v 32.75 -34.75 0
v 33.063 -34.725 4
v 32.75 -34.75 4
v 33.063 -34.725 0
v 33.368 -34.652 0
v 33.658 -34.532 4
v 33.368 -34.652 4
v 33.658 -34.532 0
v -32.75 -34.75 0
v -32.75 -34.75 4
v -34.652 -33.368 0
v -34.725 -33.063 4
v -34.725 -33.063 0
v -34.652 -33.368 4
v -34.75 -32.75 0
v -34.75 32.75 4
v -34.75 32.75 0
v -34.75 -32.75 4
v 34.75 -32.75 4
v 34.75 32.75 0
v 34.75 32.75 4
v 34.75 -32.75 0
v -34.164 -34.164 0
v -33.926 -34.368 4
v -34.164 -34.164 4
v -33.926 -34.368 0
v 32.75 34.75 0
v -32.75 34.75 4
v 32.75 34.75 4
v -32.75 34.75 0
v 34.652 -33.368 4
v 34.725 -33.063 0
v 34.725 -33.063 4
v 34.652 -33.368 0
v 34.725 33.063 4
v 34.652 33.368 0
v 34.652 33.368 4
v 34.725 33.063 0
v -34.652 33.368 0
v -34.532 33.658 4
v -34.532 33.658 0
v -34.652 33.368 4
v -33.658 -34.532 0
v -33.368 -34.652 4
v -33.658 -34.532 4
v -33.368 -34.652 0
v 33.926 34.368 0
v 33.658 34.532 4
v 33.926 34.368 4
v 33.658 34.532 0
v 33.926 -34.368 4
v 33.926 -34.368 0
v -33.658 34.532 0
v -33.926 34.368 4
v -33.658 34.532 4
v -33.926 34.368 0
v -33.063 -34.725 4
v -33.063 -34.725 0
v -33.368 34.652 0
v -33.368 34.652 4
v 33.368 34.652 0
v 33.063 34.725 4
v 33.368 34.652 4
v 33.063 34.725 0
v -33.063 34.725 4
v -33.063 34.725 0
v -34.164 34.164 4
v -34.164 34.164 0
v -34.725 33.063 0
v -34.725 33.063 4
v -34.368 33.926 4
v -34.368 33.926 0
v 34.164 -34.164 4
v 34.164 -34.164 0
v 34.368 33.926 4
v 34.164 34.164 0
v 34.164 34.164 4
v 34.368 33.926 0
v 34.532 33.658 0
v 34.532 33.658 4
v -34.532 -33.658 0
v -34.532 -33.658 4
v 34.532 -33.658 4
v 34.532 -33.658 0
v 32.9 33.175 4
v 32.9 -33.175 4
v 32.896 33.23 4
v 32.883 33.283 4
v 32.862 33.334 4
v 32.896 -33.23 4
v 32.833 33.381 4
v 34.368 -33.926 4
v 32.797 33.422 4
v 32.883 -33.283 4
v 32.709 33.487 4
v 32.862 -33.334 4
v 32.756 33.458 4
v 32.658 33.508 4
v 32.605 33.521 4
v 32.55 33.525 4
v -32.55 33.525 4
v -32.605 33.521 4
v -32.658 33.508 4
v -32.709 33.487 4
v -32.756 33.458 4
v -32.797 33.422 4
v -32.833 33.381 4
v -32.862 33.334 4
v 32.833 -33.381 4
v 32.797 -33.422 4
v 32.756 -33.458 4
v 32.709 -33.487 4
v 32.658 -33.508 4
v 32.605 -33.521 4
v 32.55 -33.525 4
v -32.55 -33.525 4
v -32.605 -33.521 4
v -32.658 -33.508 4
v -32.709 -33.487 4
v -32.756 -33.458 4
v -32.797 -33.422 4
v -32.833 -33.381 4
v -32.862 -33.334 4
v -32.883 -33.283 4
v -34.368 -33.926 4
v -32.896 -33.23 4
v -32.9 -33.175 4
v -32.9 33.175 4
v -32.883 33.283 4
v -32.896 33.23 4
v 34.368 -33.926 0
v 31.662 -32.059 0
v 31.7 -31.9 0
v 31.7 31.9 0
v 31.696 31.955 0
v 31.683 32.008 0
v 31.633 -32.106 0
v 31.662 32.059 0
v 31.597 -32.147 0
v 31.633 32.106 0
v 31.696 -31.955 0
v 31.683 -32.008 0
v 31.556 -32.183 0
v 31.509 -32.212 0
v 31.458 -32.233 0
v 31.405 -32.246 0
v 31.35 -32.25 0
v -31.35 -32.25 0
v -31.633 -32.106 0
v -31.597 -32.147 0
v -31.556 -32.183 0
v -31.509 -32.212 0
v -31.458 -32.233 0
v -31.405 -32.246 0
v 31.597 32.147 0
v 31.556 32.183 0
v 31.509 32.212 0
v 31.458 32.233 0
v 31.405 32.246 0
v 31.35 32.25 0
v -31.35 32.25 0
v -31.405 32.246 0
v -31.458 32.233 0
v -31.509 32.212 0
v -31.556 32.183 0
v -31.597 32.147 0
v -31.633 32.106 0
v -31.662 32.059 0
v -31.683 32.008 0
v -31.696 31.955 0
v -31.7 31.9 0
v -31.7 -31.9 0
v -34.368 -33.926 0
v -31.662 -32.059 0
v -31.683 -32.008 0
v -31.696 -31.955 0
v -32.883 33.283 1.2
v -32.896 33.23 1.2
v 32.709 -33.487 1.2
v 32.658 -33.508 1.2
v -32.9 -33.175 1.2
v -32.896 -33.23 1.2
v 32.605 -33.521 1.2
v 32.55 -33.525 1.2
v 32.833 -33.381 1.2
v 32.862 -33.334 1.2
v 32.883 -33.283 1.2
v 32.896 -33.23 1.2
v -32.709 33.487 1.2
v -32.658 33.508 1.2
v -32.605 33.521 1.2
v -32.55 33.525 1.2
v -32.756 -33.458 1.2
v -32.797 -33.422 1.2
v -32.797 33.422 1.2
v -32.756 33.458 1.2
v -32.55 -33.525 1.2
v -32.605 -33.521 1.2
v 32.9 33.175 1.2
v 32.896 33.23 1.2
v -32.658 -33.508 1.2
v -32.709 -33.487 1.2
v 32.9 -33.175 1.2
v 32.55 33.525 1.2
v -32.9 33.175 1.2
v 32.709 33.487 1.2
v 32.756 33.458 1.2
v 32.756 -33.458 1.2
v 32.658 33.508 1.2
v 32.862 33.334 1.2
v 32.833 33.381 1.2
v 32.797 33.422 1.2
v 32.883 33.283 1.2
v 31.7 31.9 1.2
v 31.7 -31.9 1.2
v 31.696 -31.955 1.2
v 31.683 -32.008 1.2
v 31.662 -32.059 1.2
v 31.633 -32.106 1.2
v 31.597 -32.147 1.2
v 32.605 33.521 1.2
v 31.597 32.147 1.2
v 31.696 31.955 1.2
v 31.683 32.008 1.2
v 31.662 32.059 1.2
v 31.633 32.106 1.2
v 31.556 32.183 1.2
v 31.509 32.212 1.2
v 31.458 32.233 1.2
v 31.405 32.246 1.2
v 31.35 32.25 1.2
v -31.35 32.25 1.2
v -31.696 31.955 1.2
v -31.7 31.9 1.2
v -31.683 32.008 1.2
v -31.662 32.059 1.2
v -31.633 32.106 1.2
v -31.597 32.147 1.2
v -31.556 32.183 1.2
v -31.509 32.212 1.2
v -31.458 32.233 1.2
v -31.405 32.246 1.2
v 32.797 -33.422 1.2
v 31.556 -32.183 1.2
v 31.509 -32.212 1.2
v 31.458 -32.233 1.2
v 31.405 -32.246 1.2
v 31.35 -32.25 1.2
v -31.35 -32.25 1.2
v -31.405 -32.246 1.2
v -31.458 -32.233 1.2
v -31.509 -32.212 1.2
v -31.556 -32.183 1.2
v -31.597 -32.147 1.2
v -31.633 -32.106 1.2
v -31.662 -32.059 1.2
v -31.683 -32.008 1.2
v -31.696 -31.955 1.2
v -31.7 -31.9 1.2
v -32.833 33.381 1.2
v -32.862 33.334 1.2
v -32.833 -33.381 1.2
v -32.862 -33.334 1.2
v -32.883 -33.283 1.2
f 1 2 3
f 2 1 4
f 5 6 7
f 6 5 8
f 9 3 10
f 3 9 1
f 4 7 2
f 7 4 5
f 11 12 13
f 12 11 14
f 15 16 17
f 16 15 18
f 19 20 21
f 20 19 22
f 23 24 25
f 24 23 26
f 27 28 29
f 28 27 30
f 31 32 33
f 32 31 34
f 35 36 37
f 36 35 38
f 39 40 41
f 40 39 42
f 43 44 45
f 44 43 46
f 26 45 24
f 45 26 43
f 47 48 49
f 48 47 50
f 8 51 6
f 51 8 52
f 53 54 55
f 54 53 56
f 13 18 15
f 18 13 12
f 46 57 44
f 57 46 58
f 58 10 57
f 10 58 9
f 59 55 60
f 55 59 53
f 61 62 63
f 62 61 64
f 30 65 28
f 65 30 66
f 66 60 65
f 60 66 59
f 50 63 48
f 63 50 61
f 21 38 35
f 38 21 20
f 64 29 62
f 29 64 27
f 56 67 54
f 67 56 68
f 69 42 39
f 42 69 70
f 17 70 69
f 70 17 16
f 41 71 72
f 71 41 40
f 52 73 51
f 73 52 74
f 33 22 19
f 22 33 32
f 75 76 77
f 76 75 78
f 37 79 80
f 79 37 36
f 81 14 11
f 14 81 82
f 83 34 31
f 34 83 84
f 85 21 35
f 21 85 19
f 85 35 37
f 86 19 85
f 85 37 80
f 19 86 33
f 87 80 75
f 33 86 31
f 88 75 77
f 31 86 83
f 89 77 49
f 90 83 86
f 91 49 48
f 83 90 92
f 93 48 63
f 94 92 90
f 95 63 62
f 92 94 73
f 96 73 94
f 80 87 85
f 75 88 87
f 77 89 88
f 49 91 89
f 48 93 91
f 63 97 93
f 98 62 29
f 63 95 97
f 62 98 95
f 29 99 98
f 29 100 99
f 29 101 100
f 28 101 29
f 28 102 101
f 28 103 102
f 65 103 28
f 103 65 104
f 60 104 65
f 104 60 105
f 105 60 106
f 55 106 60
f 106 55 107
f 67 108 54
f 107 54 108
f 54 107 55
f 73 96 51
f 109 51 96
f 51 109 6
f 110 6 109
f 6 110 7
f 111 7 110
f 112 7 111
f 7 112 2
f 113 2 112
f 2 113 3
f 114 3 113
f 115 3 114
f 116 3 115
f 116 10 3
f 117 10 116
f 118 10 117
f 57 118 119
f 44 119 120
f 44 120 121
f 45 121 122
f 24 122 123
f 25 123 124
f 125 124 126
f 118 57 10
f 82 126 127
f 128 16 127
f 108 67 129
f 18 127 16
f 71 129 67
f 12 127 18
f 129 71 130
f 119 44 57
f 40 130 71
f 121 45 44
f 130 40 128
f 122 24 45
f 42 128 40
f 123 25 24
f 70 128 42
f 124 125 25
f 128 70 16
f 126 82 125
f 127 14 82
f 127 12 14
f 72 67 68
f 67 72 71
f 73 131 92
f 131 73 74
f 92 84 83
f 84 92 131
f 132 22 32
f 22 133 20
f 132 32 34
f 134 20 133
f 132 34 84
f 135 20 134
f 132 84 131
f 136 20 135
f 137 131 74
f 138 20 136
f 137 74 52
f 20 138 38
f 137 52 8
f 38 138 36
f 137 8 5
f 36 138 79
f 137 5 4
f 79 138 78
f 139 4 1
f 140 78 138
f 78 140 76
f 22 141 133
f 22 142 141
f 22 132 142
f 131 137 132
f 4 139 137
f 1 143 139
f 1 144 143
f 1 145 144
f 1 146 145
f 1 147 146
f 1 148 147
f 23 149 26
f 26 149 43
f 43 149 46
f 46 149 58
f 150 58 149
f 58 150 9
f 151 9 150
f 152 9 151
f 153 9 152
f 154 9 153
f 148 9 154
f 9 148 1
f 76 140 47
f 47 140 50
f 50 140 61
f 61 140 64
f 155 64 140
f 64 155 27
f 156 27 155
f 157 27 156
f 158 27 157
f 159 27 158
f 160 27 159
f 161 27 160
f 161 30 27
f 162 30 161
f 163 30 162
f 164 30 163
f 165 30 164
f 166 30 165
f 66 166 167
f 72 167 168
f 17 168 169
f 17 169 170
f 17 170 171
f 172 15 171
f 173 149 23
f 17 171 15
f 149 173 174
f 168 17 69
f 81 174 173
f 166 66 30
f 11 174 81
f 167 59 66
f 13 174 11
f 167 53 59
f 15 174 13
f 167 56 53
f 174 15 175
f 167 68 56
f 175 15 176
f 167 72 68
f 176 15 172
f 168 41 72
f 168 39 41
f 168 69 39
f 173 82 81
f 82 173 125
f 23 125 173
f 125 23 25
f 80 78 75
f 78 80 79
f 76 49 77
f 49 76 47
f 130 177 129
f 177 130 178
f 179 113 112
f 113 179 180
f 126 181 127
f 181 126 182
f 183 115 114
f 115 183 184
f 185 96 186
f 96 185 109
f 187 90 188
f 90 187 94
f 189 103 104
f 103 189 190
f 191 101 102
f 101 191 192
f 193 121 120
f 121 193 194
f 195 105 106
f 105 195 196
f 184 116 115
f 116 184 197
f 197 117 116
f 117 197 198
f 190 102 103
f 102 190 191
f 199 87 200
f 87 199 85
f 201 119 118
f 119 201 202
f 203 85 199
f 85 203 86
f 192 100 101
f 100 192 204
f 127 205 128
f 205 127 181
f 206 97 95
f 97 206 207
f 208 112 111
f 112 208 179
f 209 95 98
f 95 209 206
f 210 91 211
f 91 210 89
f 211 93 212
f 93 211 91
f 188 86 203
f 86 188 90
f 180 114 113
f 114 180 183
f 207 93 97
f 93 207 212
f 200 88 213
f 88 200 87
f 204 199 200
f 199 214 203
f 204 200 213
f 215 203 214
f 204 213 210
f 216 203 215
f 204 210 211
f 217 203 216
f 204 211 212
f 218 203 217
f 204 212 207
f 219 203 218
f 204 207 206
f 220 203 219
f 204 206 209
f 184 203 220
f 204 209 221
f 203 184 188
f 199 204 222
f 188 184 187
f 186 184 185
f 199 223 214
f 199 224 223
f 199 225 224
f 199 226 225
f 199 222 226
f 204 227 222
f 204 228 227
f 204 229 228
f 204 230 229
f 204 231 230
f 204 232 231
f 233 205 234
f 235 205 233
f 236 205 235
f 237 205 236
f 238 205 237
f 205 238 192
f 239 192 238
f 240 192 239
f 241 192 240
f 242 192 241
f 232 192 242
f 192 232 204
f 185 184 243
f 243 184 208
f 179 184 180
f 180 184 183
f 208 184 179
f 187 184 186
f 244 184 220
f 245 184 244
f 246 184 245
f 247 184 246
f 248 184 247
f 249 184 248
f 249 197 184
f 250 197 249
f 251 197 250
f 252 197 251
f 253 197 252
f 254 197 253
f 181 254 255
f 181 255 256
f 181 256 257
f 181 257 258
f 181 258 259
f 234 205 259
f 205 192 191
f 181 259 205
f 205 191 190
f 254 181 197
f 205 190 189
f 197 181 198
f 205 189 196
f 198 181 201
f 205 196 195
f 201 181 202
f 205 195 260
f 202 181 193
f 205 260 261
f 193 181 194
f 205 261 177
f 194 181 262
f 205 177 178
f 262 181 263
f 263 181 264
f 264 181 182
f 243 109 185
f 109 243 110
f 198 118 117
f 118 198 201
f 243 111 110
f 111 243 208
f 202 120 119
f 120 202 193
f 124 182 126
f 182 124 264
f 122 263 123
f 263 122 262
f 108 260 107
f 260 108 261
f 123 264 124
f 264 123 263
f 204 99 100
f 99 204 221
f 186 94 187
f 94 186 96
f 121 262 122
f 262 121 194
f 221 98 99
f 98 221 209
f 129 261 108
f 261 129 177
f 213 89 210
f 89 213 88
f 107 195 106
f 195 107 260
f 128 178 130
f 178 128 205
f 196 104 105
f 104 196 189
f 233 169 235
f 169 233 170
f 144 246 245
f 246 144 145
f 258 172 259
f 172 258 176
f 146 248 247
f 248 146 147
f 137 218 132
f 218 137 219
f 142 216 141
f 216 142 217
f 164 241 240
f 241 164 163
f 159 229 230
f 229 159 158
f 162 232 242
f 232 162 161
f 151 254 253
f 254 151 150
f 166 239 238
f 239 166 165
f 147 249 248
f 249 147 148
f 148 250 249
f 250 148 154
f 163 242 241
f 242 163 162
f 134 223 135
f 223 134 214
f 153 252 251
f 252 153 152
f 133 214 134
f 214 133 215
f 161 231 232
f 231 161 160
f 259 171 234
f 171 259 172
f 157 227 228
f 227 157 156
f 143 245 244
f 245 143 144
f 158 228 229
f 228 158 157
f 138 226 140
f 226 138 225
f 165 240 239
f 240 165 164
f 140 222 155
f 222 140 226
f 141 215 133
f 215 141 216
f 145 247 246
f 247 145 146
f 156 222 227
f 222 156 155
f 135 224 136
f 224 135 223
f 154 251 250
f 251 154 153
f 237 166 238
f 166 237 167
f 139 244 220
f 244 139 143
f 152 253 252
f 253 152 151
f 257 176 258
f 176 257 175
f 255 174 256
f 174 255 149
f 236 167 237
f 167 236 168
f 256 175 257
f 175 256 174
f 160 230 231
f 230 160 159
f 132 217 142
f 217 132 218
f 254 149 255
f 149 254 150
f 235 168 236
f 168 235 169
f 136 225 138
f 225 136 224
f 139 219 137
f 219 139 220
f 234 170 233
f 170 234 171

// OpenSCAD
/*
  64 NeoPixel Matrix PCB Frame - front loading friction-fit version

  PCB: 65.4 x 66.5 mm
  Outer frame: 69.5 x 69.5 mm

  Board pushes in from the front.
  Rear lip will face inside the future cube.
*/

outer_size = 69.5;

pcb_w = 65.4;
pcb_h = 66.5;

pcb_w_clearance = 0.40;  // tighter side - visible gap before
pcb_h_clearance = 0.55;  // already looked close, so only slightly tighter

frame_depth = 4.0;

rear_lip_height = 1.2;
rear_lip_width = 1.0;

outer_corner_radius = 2.0;
pocket_corner_radius = 0.35;

$fn = 40;

module rounded_rect(w, h, r) {
    offset(r = r)
        square([w - r * 2, h - r * 2], center = true);
}

module matrix_frame_front_load() {
    difference() {
        linear_extrude(frame_depth)
            rounded_rect(outer_size, outer_size, outer_corner_radius);

        translate([0, 0, rear_lip_height])
            linear_extrude(frame_depth - rear_lip_height + 0.1)
                rounded_rect(
                    pcb_w + pcb_w_clearance,
                    pcb_h + pcb_h_clearance,
                    pocket_corner_radius
                );

        translate([0, 0, -0.1])
            linear_extrude(rear_lip_height + 0.2)
                rounded_rect(
                    pcb_w - rear_lip_width * 2,
                    pcb_h - rear_lip_width * 2,
                    pocket_corner_radius
                );
    }
}

matrix_frame_front_load();
